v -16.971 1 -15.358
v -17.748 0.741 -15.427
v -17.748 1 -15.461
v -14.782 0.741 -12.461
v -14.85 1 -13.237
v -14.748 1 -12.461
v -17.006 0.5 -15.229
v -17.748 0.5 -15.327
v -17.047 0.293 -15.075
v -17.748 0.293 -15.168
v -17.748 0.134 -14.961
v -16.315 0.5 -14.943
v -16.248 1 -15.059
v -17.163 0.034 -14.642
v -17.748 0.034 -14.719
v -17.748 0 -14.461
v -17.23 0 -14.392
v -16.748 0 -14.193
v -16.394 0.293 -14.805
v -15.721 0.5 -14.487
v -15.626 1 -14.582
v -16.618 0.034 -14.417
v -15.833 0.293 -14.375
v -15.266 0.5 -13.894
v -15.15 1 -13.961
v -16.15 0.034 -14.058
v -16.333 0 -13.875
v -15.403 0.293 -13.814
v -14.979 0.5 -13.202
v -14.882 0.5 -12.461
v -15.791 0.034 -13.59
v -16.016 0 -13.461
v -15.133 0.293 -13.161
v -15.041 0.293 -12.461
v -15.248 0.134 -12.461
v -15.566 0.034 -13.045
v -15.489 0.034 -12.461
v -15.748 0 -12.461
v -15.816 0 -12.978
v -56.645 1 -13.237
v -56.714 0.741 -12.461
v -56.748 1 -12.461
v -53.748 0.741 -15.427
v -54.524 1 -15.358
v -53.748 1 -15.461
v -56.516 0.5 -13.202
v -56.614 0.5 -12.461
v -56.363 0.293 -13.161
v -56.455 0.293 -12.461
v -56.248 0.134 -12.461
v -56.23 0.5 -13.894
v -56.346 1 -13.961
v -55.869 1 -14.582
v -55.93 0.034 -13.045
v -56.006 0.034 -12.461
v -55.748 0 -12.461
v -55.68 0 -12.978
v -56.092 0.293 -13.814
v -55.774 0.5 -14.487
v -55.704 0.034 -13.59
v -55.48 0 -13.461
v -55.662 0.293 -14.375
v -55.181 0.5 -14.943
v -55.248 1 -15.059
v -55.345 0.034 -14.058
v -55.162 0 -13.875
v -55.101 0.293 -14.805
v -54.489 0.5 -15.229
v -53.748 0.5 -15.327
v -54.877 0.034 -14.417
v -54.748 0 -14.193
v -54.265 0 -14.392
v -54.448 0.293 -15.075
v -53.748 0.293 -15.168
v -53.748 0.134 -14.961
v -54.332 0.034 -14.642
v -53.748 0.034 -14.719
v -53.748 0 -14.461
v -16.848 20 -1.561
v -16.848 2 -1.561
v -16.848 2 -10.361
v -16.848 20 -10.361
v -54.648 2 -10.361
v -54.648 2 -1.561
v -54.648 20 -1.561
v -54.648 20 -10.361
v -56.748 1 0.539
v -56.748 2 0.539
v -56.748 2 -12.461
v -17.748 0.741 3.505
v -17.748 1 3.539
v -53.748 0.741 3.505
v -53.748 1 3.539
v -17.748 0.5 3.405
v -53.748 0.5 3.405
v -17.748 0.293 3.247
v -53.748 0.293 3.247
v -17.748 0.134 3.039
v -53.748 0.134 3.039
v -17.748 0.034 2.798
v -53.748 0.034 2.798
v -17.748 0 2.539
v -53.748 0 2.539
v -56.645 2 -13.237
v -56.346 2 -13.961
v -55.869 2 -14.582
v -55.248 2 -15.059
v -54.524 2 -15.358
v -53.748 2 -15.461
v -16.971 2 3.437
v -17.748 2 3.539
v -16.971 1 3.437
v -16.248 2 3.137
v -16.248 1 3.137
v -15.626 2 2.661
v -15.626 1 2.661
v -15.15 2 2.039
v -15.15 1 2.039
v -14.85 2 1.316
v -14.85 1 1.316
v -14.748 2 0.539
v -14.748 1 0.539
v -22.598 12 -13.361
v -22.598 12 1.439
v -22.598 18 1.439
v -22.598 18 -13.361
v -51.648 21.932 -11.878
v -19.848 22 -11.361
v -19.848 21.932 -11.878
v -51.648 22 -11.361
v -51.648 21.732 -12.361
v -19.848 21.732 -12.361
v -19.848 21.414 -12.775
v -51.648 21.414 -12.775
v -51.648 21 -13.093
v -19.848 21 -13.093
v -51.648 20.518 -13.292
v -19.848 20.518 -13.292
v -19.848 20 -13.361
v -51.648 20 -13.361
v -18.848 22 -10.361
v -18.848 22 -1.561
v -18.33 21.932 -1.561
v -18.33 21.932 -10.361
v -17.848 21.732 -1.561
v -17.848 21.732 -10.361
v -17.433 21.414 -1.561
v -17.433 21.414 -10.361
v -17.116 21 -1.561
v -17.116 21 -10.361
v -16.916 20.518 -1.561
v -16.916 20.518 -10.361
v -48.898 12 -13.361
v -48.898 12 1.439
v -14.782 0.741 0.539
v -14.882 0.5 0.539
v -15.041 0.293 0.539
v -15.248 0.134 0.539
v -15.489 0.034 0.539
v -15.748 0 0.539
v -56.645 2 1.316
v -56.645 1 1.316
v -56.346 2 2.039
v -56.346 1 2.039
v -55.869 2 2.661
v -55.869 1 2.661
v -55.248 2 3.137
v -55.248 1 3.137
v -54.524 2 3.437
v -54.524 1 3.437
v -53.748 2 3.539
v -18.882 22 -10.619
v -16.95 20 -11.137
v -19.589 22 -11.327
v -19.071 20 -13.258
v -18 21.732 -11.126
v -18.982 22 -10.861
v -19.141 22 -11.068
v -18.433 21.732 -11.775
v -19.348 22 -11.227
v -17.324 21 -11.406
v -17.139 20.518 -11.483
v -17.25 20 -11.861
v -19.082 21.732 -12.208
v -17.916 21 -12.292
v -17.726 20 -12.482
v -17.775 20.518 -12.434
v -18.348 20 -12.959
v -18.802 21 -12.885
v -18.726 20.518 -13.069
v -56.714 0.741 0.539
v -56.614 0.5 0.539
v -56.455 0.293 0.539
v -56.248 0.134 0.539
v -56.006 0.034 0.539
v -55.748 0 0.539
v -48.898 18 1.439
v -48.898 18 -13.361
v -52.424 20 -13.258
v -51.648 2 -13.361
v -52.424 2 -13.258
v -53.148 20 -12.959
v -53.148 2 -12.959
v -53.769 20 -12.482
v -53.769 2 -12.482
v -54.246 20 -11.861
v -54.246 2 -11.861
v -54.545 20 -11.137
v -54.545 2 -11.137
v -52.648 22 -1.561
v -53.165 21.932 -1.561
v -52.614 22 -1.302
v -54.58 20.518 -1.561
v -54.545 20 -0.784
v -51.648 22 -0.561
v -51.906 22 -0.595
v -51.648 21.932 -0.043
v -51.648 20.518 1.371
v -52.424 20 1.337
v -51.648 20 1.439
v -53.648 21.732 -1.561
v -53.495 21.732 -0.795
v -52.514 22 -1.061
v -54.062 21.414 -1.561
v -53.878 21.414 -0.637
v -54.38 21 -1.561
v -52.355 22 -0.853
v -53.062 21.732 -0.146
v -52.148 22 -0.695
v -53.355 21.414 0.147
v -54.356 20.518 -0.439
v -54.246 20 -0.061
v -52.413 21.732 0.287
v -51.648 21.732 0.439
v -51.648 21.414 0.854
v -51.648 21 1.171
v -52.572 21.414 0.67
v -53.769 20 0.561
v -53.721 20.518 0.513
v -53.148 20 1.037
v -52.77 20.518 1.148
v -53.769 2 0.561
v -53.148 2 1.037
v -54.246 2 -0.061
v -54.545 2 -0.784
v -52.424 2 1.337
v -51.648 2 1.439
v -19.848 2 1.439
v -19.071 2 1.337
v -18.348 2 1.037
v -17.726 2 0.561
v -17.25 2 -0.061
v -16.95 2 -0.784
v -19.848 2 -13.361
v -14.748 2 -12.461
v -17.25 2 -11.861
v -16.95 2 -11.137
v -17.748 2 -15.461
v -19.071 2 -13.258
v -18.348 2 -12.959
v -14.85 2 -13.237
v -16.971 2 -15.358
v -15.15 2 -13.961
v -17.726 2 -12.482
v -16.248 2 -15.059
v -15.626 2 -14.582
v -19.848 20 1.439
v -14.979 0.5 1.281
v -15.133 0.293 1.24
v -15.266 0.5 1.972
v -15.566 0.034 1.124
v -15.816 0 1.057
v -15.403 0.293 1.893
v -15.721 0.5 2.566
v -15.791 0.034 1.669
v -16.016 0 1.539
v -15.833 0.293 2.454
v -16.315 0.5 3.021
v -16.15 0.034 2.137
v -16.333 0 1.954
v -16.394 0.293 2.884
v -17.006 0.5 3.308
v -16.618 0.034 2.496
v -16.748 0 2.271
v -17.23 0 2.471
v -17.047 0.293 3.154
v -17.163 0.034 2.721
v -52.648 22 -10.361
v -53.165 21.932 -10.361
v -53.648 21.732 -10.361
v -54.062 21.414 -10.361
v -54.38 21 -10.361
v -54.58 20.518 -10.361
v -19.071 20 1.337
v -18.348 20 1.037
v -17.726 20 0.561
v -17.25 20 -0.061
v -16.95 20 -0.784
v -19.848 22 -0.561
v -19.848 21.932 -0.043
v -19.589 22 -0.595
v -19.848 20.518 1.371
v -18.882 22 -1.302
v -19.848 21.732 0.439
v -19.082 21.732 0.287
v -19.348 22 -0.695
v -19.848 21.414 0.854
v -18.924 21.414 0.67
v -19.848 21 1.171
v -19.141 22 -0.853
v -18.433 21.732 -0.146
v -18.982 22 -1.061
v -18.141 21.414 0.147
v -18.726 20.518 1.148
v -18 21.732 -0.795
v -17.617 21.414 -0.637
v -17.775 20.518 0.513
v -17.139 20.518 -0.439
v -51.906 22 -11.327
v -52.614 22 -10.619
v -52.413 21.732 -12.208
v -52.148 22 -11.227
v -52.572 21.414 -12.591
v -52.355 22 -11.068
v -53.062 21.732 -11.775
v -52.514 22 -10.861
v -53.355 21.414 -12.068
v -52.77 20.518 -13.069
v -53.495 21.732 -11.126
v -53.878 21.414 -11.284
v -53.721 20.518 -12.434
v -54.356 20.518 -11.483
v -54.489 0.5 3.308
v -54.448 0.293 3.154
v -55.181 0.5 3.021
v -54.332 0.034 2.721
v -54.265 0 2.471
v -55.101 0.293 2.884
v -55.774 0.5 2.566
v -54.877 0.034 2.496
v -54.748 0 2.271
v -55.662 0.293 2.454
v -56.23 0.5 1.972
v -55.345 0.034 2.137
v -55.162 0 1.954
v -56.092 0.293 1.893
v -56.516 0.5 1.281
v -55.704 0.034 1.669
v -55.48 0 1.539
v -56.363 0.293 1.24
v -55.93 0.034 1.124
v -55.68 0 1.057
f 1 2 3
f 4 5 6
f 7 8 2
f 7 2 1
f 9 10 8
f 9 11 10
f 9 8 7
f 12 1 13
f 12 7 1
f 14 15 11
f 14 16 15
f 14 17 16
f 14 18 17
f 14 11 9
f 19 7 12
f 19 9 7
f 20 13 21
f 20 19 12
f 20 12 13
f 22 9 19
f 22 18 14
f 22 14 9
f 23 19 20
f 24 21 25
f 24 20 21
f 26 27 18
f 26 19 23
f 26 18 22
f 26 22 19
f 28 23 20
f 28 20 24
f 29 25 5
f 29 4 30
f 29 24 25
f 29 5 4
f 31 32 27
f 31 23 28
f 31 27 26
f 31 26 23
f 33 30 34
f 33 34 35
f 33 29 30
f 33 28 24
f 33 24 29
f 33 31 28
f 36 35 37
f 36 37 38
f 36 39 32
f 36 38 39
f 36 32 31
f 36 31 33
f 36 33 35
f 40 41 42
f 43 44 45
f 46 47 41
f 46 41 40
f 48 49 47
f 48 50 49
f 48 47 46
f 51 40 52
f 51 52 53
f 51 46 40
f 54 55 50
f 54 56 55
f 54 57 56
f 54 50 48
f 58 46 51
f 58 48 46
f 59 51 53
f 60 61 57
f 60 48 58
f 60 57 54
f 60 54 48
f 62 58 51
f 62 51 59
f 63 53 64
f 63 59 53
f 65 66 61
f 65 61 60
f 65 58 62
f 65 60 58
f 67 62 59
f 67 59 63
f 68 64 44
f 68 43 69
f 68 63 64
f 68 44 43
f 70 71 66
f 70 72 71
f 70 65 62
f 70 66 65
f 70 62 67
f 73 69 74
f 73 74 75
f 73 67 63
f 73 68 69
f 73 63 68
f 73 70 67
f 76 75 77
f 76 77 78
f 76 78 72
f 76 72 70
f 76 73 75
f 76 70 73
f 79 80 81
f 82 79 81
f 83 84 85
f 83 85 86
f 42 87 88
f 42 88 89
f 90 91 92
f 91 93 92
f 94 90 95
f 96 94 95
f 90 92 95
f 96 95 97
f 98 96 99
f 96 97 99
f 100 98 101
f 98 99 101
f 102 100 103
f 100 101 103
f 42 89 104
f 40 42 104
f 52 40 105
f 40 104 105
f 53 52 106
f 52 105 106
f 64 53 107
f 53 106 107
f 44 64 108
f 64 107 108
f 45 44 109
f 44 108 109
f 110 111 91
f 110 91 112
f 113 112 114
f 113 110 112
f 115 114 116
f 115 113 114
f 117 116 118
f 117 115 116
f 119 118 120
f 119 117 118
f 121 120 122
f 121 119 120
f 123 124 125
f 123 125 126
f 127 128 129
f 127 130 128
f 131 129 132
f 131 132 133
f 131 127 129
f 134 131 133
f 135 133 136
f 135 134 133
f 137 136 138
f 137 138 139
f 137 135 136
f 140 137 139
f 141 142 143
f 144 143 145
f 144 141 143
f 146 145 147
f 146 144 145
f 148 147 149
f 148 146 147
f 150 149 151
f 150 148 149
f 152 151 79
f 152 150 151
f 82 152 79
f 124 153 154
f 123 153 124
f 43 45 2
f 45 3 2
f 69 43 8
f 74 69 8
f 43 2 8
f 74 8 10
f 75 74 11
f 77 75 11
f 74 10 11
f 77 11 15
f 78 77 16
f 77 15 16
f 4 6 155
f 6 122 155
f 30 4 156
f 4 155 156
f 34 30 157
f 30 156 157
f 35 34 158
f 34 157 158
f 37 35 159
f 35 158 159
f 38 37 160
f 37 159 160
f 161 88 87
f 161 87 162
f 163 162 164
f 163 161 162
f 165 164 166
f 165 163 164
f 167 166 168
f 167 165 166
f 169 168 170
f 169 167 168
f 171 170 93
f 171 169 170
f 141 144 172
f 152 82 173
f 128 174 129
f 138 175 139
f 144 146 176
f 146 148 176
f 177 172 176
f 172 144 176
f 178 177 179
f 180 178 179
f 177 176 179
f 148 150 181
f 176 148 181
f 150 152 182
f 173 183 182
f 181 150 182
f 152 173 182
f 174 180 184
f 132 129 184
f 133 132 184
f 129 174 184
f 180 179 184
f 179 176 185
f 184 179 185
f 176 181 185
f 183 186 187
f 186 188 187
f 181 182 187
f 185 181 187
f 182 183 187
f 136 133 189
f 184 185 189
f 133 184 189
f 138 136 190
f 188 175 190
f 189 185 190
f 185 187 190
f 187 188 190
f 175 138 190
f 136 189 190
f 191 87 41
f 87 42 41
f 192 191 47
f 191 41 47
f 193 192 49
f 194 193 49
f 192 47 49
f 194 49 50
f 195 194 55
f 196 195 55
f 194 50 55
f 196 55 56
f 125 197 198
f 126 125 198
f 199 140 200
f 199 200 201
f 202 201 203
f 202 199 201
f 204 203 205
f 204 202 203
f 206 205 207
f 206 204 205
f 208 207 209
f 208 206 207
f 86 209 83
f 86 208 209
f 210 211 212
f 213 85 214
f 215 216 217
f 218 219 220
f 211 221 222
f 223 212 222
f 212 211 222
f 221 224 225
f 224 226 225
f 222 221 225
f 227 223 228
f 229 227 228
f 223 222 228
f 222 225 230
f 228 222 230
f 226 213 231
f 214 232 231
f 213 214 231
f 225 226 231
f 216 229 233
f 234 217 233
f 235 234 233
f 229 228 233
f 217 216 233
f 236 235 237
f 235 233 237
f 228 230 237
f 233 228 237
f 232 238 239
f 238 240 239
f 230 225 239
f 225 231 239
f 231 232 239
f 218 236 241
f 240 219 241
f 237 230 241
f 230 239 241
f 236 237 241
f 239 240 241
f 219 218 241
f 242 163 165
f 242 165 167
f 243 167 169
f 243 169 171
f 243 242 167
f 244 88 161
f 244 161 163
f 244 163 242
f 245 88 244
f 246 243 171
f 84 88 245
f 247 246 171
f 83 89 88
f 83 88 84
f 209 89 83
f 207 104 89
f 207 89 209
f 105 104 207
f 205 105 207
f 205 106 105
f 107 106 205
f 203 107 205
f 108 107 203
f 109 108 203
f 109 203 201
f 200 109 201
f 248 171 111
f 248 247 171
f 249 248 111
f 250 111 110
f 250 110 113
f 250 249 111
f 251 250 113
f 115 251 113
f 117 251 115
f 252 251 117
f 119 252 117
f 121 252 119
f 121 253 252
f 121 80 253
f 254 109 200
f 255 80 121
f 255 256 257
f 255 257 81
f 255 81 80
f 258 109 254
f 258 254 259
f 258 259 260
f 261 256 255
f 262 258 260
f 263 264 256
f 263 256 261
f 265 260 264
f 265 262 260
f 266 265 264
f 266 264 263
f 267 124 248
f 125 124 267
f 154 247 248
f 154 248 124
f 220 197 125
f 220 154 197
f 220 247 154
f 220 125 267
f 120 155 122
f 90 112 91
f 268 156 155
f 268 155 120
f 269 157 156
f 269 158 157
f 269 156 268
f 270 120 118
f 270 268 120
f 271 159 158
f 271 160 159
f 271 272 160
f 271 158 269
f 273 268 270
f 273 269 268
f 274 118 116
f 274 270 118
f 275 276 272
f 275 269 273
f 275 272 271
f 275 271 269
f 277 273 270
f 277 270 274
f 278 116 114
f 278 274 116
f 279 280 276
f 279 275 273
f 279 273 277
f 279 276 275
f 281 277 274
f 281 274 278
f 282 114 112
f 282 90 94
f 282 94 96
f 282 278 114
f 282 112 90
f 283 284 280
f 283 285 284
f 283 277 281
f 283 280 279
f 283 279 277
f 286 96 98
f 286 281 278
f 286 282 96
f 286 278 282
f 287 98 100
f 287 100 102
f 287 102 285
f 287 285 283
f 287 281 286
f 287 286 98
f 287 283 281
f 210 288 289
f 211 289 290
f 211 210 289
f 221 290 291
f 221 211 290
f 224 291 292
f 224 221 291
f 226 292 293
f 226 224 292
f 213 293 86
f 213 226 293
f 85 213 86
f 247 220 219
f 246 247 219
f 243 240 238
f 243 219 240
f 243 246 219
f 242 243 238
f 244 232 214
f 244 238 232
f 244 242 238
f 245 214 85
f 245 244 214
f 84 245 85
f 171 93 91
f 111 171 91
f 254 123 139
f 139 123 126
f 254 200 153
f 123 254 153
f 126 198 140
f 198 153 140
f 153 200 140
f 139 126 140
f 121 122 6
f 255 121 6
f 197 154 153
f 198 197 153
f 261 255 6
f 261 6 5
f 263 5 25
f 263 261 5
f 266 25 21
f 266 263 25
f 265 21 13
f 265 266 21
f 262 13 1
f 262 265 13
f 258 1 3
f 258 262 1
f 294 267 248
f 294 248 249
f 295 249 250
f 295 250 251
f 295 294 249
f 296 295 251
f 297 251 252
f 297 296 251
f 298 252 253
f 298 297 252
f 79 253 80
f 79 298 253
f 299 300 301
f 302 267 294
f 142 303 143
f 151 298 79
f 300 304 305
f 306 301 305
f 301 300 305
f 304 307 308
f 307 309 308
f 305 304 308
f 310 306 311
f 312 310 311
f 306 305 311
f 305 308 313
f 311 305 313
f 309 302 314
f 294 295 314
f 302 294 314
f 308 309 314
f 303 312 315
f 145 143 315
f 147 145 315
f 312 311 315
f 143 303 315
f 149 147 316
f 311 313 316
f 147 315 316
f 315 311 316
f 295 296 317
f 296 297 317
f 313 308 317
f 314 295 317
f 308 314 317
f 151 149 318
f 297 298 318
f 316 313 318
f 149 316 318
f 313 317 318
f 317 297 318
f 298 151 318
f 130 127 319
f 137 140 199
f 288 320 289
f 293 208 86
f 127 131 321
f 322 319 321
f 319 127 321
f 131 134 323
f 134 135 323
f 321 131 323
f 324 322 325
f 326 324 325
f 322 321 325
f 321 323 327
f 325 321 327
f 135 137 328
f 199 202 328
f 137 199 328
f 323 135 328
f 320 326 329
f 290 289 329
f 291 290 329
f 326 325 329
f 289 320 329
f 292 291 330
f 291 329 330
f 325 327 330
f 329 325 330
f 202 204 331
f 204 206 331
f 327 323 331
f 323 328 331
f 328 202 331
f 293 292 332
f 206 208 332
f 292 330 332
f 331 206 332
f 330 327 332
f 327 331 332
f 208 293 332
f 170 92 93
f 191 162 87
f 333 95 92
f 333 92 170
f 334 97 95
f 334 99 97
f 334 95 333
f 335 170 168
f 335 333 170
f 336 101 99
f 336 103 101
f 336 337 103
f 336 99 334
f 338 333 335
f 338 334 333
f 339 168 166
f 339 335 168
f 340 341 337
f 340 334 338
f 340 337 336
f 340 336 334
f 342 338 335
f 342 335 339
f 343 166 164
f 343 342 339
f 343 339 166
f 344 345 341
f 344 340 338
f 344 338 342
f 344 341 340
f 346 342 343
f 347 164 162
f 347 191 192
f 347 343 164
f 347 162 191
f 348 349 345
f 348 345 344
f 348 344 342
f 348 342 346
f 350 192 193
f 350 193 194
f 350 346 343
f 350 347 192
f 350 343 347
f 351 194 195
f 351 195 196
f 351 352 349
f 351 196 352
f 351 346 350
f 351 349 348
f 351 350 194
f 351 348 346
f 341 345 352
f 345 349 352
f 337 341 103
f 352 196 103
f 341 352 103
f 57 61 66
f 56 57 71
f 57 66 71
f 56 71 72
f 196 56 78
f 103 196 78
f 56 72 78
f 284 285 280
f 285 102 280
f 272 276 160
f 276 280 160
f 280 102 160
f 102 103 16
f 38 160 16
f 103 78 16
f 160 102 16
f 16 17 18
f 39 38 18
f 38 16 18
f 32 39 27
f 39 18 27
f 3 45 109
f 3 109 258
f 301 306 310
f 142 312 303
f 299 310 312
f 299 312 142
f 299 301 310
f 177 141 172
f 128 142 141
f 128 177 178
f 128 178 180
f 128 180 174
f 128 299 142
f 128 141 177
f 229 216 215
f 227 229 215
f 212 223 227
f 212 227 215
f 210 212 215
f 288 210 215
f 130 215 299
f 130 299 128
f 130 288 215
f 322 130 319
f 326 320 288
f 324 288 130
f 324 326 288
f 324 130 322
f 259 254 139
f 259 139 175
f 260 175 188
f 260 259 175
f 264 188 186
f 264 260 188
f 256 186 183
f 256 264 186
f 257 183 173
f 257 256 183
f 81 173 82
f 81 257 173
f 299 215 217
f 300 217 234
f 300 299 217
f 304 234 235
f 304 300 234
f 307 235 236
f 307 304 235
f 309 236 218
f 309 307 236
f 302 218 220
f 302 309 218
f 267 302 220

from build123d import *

# Parameters (mm, degrees)
SKETCH1_W           = 42
SKETCH1_H           = 19
BOSS_EXTRUDE1_DEPTH = 2
FILLET1_R           = 3
FILLET2_R           = 1
SKETCH2_W           = 37.8
SKETCH2_H           = 14.8
BOSS_EXTRUDE2_DEPTH = 10
SKETCH3_W           = 5.75
SKETCH3_H           = 14.8
BOSS_EXTRUDE3_DEPTH = 10
SKETCH5_W           = 14.8
SKETCH5_H           = 4
BOSS_EXTRUDE4_DEPTH = 26.3
FILLET4_R           = 3
FILLET5_R           = 2


with BuildPart() as part:
    # Sketch1 → Boss-Extrude1 (new body)
    with BuildSketch(Plane(origin=(0, 0, 0), x_dir=(1, 0, 0), z_dir=(0, 1, 0))):
        with Locations((-35.747676634, 5.960595817)):
            Rectangle(SKETCH1_W, SKETCH1_H)
    extrude(amount=BOSS_EXTRUDE1_DEPTH)

    # Fillet1
    fillet1_edges = [part.edges().sort_by_distance(p)[0] for p in [
        (-56.747676634, 1, -15.460595817),
        (-14.747676634, 1, -15.460595817),
        (-14.747676634, 1, 3.539404183),
        (-56.747676634, 1, 3.539404183),
    ]]
    fillet(fillet1_edges, radius=FILLET1_R)

    # Fillet2
    fillet2_edges = [part.edges().sort_by_distance(p)[0] for p in [
        (-56.747676634, 0, -5.960595817),
        (-35.747676634, 0, -15.460595817),
        (-14.747676634, 0, -5.960595817),
        (-35.747676634, 0, 3.539404183),
        (-15.62635629, 0, 2.660724527),
        (-15.62635629, 0, -14.58191616),
        (-55.868996977, 0, 2.660724527),
        (-55.868996977, 0, -14.58191616),
    ]]
    fillet(fillet2_edges, radius=FILLET2_R)

    # Sketch2 → Boss-Extrude2 (add)
    with BuildSketch(Plane(origin=(0, 2, 0), x_dir=(1, 0, 0), z_dir=(0, 1, 0))):
        with Locations((-35.747676634, 5.960595817)):
            Rectangle(SKETCH2_W, SKETCH2_H)
    extrude(amount=BOSS_EXTRUDE2_DEPTH)

    # Sketch3 → Boss-Extrude3 (add)
    with BuildSketch(Plane(origin=(0, 12, 0), x_dir=(1, 0, 0), z_dir=(0, 1, 0))):
        with Locations((-19.722676634, 5.960595817)):
            Rectangle(SKETCH3_W, SKETCH3_H)
        with Locations((-51.772676634, 5.960595817)):
            Rectangle(SKETCH3_W, SKETCH3_H)
    extrude(amount=BOSS_EXTRUDE3_DEPTH)

    # Sketch5 → Boss-Extrude4 (add)
    with BuildSketch(Plane(origin=(-48.897676634, 0, 0), x_dir=(0, 0, -1), z_dir=(1, 0, 0))):
        with Locations((5.960595817, 20)):
            Rectangle(SKETCH5_W, SKETCH5_H)
    extrude(amount=BOSS_EXTRUDE4_DEPTH)

    # Fillet4
    fillet4_edges = [part.edges().sort_by_distance(p)[0] for p in [
        (-54.647676634, 12, -13.360595817),
        (-54.647676634, 12, 1.439404183),
        (-16.847676634, 12, 1.439404183),
        (-16.847676634, 12, -13.360595817),
    ]]
    fillet(fillet4_edges, radius=FILLET4_R)

    # Fillet5
    fillet5_edges = [part.edges().sort_by_distance(p)[0] for p in [
        (-35.747676634, 22, -13.360595817),
        (-16.847676634, 22, -5.960595817),
        (-35.747676634, 22, 1.439404183),
        (-54.647676634, 22, -5.960595817),
        (-53.768996977, 22, 0.560724527),
        (-53.768996977, 22, -12.48191616),
        (-17.72635629, 22, 0.560724527),
        (-17.72635629, 22, -12.48191616),
    ]]
    fillet(fillet5_edges, radius=FILLET5_R)


solid = part.part
